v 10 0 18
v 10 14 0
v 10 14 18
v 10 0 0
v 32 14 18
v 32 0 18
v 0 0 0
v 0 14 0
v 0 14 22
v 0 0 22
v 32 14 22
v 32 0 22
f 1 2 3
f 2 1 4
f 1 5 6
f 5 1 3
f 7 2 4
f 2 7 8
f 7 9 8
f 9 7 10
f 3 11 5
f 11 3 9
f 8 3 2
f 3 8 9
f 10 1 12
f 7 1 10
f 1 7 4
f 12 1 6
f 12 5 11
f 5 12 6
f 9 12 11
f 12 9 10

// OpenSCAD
// Support peel-off test coupon
// lizard-spock.co.uk/bambu-easy-remove-support-settings.html
//
// An inverted L. The underside of the arm is a flat overhang with nothing
// below it, so the slicer must support it from the build plate. Printing one
// coupon per candidate Top Z distance tells you which value peels cleanly:
//
//   - the arm underside is the surface to inspect once the support is off
//   - the post beside the support column tests the XY clearance
//   - the support column is tall enough to get a fingernail under
//
// Set label to the value under test, for example "0.25", to tell a row of
// printed coupons apart afterwards.

/* [Coupon] */
// Post footprint along X
post_width  = 10;
// Depth of the whole coupon along Y
depth       = 14;
// Height from the plate to the underside of the arm
post_height = 18;
// Length of the unsupported overhang along X
arm_length  = 22;
// Thickness of the arm
arm_thick   = 4;

/* [Label] */
// Text embossed on top of the arm, empty for none
label        = "";
label_size   = 5;
label_depth  = 0.6;

/* [Hidden] */
$fn = 48;

module coupon() {
    union() {
        // Vertical post, the only part that reaches the plate
        cube([post_width, depth, post_height]);

        // Arm cantilevered in +X, its underside is the overhang under test
        translate([0, 0, post_height])
            cube([post_width + arm_length, depth, arm_thick]);
    }
}

module labelled_coupon() {
    if (label == "") {
        coupon();
    } else {
        difference() {
            coupon();
            translate([post_width + arm_length / 2,
                       depth / 2,
                       post_height + arm_thick - label_depth])
                linear_extrude(label_depth + 0.01)
                    text(label, size = label_size,
                         halign = "center", valign = "center",
                         font = "Helvetica");
        }
    }
}

labelled_coupon();
